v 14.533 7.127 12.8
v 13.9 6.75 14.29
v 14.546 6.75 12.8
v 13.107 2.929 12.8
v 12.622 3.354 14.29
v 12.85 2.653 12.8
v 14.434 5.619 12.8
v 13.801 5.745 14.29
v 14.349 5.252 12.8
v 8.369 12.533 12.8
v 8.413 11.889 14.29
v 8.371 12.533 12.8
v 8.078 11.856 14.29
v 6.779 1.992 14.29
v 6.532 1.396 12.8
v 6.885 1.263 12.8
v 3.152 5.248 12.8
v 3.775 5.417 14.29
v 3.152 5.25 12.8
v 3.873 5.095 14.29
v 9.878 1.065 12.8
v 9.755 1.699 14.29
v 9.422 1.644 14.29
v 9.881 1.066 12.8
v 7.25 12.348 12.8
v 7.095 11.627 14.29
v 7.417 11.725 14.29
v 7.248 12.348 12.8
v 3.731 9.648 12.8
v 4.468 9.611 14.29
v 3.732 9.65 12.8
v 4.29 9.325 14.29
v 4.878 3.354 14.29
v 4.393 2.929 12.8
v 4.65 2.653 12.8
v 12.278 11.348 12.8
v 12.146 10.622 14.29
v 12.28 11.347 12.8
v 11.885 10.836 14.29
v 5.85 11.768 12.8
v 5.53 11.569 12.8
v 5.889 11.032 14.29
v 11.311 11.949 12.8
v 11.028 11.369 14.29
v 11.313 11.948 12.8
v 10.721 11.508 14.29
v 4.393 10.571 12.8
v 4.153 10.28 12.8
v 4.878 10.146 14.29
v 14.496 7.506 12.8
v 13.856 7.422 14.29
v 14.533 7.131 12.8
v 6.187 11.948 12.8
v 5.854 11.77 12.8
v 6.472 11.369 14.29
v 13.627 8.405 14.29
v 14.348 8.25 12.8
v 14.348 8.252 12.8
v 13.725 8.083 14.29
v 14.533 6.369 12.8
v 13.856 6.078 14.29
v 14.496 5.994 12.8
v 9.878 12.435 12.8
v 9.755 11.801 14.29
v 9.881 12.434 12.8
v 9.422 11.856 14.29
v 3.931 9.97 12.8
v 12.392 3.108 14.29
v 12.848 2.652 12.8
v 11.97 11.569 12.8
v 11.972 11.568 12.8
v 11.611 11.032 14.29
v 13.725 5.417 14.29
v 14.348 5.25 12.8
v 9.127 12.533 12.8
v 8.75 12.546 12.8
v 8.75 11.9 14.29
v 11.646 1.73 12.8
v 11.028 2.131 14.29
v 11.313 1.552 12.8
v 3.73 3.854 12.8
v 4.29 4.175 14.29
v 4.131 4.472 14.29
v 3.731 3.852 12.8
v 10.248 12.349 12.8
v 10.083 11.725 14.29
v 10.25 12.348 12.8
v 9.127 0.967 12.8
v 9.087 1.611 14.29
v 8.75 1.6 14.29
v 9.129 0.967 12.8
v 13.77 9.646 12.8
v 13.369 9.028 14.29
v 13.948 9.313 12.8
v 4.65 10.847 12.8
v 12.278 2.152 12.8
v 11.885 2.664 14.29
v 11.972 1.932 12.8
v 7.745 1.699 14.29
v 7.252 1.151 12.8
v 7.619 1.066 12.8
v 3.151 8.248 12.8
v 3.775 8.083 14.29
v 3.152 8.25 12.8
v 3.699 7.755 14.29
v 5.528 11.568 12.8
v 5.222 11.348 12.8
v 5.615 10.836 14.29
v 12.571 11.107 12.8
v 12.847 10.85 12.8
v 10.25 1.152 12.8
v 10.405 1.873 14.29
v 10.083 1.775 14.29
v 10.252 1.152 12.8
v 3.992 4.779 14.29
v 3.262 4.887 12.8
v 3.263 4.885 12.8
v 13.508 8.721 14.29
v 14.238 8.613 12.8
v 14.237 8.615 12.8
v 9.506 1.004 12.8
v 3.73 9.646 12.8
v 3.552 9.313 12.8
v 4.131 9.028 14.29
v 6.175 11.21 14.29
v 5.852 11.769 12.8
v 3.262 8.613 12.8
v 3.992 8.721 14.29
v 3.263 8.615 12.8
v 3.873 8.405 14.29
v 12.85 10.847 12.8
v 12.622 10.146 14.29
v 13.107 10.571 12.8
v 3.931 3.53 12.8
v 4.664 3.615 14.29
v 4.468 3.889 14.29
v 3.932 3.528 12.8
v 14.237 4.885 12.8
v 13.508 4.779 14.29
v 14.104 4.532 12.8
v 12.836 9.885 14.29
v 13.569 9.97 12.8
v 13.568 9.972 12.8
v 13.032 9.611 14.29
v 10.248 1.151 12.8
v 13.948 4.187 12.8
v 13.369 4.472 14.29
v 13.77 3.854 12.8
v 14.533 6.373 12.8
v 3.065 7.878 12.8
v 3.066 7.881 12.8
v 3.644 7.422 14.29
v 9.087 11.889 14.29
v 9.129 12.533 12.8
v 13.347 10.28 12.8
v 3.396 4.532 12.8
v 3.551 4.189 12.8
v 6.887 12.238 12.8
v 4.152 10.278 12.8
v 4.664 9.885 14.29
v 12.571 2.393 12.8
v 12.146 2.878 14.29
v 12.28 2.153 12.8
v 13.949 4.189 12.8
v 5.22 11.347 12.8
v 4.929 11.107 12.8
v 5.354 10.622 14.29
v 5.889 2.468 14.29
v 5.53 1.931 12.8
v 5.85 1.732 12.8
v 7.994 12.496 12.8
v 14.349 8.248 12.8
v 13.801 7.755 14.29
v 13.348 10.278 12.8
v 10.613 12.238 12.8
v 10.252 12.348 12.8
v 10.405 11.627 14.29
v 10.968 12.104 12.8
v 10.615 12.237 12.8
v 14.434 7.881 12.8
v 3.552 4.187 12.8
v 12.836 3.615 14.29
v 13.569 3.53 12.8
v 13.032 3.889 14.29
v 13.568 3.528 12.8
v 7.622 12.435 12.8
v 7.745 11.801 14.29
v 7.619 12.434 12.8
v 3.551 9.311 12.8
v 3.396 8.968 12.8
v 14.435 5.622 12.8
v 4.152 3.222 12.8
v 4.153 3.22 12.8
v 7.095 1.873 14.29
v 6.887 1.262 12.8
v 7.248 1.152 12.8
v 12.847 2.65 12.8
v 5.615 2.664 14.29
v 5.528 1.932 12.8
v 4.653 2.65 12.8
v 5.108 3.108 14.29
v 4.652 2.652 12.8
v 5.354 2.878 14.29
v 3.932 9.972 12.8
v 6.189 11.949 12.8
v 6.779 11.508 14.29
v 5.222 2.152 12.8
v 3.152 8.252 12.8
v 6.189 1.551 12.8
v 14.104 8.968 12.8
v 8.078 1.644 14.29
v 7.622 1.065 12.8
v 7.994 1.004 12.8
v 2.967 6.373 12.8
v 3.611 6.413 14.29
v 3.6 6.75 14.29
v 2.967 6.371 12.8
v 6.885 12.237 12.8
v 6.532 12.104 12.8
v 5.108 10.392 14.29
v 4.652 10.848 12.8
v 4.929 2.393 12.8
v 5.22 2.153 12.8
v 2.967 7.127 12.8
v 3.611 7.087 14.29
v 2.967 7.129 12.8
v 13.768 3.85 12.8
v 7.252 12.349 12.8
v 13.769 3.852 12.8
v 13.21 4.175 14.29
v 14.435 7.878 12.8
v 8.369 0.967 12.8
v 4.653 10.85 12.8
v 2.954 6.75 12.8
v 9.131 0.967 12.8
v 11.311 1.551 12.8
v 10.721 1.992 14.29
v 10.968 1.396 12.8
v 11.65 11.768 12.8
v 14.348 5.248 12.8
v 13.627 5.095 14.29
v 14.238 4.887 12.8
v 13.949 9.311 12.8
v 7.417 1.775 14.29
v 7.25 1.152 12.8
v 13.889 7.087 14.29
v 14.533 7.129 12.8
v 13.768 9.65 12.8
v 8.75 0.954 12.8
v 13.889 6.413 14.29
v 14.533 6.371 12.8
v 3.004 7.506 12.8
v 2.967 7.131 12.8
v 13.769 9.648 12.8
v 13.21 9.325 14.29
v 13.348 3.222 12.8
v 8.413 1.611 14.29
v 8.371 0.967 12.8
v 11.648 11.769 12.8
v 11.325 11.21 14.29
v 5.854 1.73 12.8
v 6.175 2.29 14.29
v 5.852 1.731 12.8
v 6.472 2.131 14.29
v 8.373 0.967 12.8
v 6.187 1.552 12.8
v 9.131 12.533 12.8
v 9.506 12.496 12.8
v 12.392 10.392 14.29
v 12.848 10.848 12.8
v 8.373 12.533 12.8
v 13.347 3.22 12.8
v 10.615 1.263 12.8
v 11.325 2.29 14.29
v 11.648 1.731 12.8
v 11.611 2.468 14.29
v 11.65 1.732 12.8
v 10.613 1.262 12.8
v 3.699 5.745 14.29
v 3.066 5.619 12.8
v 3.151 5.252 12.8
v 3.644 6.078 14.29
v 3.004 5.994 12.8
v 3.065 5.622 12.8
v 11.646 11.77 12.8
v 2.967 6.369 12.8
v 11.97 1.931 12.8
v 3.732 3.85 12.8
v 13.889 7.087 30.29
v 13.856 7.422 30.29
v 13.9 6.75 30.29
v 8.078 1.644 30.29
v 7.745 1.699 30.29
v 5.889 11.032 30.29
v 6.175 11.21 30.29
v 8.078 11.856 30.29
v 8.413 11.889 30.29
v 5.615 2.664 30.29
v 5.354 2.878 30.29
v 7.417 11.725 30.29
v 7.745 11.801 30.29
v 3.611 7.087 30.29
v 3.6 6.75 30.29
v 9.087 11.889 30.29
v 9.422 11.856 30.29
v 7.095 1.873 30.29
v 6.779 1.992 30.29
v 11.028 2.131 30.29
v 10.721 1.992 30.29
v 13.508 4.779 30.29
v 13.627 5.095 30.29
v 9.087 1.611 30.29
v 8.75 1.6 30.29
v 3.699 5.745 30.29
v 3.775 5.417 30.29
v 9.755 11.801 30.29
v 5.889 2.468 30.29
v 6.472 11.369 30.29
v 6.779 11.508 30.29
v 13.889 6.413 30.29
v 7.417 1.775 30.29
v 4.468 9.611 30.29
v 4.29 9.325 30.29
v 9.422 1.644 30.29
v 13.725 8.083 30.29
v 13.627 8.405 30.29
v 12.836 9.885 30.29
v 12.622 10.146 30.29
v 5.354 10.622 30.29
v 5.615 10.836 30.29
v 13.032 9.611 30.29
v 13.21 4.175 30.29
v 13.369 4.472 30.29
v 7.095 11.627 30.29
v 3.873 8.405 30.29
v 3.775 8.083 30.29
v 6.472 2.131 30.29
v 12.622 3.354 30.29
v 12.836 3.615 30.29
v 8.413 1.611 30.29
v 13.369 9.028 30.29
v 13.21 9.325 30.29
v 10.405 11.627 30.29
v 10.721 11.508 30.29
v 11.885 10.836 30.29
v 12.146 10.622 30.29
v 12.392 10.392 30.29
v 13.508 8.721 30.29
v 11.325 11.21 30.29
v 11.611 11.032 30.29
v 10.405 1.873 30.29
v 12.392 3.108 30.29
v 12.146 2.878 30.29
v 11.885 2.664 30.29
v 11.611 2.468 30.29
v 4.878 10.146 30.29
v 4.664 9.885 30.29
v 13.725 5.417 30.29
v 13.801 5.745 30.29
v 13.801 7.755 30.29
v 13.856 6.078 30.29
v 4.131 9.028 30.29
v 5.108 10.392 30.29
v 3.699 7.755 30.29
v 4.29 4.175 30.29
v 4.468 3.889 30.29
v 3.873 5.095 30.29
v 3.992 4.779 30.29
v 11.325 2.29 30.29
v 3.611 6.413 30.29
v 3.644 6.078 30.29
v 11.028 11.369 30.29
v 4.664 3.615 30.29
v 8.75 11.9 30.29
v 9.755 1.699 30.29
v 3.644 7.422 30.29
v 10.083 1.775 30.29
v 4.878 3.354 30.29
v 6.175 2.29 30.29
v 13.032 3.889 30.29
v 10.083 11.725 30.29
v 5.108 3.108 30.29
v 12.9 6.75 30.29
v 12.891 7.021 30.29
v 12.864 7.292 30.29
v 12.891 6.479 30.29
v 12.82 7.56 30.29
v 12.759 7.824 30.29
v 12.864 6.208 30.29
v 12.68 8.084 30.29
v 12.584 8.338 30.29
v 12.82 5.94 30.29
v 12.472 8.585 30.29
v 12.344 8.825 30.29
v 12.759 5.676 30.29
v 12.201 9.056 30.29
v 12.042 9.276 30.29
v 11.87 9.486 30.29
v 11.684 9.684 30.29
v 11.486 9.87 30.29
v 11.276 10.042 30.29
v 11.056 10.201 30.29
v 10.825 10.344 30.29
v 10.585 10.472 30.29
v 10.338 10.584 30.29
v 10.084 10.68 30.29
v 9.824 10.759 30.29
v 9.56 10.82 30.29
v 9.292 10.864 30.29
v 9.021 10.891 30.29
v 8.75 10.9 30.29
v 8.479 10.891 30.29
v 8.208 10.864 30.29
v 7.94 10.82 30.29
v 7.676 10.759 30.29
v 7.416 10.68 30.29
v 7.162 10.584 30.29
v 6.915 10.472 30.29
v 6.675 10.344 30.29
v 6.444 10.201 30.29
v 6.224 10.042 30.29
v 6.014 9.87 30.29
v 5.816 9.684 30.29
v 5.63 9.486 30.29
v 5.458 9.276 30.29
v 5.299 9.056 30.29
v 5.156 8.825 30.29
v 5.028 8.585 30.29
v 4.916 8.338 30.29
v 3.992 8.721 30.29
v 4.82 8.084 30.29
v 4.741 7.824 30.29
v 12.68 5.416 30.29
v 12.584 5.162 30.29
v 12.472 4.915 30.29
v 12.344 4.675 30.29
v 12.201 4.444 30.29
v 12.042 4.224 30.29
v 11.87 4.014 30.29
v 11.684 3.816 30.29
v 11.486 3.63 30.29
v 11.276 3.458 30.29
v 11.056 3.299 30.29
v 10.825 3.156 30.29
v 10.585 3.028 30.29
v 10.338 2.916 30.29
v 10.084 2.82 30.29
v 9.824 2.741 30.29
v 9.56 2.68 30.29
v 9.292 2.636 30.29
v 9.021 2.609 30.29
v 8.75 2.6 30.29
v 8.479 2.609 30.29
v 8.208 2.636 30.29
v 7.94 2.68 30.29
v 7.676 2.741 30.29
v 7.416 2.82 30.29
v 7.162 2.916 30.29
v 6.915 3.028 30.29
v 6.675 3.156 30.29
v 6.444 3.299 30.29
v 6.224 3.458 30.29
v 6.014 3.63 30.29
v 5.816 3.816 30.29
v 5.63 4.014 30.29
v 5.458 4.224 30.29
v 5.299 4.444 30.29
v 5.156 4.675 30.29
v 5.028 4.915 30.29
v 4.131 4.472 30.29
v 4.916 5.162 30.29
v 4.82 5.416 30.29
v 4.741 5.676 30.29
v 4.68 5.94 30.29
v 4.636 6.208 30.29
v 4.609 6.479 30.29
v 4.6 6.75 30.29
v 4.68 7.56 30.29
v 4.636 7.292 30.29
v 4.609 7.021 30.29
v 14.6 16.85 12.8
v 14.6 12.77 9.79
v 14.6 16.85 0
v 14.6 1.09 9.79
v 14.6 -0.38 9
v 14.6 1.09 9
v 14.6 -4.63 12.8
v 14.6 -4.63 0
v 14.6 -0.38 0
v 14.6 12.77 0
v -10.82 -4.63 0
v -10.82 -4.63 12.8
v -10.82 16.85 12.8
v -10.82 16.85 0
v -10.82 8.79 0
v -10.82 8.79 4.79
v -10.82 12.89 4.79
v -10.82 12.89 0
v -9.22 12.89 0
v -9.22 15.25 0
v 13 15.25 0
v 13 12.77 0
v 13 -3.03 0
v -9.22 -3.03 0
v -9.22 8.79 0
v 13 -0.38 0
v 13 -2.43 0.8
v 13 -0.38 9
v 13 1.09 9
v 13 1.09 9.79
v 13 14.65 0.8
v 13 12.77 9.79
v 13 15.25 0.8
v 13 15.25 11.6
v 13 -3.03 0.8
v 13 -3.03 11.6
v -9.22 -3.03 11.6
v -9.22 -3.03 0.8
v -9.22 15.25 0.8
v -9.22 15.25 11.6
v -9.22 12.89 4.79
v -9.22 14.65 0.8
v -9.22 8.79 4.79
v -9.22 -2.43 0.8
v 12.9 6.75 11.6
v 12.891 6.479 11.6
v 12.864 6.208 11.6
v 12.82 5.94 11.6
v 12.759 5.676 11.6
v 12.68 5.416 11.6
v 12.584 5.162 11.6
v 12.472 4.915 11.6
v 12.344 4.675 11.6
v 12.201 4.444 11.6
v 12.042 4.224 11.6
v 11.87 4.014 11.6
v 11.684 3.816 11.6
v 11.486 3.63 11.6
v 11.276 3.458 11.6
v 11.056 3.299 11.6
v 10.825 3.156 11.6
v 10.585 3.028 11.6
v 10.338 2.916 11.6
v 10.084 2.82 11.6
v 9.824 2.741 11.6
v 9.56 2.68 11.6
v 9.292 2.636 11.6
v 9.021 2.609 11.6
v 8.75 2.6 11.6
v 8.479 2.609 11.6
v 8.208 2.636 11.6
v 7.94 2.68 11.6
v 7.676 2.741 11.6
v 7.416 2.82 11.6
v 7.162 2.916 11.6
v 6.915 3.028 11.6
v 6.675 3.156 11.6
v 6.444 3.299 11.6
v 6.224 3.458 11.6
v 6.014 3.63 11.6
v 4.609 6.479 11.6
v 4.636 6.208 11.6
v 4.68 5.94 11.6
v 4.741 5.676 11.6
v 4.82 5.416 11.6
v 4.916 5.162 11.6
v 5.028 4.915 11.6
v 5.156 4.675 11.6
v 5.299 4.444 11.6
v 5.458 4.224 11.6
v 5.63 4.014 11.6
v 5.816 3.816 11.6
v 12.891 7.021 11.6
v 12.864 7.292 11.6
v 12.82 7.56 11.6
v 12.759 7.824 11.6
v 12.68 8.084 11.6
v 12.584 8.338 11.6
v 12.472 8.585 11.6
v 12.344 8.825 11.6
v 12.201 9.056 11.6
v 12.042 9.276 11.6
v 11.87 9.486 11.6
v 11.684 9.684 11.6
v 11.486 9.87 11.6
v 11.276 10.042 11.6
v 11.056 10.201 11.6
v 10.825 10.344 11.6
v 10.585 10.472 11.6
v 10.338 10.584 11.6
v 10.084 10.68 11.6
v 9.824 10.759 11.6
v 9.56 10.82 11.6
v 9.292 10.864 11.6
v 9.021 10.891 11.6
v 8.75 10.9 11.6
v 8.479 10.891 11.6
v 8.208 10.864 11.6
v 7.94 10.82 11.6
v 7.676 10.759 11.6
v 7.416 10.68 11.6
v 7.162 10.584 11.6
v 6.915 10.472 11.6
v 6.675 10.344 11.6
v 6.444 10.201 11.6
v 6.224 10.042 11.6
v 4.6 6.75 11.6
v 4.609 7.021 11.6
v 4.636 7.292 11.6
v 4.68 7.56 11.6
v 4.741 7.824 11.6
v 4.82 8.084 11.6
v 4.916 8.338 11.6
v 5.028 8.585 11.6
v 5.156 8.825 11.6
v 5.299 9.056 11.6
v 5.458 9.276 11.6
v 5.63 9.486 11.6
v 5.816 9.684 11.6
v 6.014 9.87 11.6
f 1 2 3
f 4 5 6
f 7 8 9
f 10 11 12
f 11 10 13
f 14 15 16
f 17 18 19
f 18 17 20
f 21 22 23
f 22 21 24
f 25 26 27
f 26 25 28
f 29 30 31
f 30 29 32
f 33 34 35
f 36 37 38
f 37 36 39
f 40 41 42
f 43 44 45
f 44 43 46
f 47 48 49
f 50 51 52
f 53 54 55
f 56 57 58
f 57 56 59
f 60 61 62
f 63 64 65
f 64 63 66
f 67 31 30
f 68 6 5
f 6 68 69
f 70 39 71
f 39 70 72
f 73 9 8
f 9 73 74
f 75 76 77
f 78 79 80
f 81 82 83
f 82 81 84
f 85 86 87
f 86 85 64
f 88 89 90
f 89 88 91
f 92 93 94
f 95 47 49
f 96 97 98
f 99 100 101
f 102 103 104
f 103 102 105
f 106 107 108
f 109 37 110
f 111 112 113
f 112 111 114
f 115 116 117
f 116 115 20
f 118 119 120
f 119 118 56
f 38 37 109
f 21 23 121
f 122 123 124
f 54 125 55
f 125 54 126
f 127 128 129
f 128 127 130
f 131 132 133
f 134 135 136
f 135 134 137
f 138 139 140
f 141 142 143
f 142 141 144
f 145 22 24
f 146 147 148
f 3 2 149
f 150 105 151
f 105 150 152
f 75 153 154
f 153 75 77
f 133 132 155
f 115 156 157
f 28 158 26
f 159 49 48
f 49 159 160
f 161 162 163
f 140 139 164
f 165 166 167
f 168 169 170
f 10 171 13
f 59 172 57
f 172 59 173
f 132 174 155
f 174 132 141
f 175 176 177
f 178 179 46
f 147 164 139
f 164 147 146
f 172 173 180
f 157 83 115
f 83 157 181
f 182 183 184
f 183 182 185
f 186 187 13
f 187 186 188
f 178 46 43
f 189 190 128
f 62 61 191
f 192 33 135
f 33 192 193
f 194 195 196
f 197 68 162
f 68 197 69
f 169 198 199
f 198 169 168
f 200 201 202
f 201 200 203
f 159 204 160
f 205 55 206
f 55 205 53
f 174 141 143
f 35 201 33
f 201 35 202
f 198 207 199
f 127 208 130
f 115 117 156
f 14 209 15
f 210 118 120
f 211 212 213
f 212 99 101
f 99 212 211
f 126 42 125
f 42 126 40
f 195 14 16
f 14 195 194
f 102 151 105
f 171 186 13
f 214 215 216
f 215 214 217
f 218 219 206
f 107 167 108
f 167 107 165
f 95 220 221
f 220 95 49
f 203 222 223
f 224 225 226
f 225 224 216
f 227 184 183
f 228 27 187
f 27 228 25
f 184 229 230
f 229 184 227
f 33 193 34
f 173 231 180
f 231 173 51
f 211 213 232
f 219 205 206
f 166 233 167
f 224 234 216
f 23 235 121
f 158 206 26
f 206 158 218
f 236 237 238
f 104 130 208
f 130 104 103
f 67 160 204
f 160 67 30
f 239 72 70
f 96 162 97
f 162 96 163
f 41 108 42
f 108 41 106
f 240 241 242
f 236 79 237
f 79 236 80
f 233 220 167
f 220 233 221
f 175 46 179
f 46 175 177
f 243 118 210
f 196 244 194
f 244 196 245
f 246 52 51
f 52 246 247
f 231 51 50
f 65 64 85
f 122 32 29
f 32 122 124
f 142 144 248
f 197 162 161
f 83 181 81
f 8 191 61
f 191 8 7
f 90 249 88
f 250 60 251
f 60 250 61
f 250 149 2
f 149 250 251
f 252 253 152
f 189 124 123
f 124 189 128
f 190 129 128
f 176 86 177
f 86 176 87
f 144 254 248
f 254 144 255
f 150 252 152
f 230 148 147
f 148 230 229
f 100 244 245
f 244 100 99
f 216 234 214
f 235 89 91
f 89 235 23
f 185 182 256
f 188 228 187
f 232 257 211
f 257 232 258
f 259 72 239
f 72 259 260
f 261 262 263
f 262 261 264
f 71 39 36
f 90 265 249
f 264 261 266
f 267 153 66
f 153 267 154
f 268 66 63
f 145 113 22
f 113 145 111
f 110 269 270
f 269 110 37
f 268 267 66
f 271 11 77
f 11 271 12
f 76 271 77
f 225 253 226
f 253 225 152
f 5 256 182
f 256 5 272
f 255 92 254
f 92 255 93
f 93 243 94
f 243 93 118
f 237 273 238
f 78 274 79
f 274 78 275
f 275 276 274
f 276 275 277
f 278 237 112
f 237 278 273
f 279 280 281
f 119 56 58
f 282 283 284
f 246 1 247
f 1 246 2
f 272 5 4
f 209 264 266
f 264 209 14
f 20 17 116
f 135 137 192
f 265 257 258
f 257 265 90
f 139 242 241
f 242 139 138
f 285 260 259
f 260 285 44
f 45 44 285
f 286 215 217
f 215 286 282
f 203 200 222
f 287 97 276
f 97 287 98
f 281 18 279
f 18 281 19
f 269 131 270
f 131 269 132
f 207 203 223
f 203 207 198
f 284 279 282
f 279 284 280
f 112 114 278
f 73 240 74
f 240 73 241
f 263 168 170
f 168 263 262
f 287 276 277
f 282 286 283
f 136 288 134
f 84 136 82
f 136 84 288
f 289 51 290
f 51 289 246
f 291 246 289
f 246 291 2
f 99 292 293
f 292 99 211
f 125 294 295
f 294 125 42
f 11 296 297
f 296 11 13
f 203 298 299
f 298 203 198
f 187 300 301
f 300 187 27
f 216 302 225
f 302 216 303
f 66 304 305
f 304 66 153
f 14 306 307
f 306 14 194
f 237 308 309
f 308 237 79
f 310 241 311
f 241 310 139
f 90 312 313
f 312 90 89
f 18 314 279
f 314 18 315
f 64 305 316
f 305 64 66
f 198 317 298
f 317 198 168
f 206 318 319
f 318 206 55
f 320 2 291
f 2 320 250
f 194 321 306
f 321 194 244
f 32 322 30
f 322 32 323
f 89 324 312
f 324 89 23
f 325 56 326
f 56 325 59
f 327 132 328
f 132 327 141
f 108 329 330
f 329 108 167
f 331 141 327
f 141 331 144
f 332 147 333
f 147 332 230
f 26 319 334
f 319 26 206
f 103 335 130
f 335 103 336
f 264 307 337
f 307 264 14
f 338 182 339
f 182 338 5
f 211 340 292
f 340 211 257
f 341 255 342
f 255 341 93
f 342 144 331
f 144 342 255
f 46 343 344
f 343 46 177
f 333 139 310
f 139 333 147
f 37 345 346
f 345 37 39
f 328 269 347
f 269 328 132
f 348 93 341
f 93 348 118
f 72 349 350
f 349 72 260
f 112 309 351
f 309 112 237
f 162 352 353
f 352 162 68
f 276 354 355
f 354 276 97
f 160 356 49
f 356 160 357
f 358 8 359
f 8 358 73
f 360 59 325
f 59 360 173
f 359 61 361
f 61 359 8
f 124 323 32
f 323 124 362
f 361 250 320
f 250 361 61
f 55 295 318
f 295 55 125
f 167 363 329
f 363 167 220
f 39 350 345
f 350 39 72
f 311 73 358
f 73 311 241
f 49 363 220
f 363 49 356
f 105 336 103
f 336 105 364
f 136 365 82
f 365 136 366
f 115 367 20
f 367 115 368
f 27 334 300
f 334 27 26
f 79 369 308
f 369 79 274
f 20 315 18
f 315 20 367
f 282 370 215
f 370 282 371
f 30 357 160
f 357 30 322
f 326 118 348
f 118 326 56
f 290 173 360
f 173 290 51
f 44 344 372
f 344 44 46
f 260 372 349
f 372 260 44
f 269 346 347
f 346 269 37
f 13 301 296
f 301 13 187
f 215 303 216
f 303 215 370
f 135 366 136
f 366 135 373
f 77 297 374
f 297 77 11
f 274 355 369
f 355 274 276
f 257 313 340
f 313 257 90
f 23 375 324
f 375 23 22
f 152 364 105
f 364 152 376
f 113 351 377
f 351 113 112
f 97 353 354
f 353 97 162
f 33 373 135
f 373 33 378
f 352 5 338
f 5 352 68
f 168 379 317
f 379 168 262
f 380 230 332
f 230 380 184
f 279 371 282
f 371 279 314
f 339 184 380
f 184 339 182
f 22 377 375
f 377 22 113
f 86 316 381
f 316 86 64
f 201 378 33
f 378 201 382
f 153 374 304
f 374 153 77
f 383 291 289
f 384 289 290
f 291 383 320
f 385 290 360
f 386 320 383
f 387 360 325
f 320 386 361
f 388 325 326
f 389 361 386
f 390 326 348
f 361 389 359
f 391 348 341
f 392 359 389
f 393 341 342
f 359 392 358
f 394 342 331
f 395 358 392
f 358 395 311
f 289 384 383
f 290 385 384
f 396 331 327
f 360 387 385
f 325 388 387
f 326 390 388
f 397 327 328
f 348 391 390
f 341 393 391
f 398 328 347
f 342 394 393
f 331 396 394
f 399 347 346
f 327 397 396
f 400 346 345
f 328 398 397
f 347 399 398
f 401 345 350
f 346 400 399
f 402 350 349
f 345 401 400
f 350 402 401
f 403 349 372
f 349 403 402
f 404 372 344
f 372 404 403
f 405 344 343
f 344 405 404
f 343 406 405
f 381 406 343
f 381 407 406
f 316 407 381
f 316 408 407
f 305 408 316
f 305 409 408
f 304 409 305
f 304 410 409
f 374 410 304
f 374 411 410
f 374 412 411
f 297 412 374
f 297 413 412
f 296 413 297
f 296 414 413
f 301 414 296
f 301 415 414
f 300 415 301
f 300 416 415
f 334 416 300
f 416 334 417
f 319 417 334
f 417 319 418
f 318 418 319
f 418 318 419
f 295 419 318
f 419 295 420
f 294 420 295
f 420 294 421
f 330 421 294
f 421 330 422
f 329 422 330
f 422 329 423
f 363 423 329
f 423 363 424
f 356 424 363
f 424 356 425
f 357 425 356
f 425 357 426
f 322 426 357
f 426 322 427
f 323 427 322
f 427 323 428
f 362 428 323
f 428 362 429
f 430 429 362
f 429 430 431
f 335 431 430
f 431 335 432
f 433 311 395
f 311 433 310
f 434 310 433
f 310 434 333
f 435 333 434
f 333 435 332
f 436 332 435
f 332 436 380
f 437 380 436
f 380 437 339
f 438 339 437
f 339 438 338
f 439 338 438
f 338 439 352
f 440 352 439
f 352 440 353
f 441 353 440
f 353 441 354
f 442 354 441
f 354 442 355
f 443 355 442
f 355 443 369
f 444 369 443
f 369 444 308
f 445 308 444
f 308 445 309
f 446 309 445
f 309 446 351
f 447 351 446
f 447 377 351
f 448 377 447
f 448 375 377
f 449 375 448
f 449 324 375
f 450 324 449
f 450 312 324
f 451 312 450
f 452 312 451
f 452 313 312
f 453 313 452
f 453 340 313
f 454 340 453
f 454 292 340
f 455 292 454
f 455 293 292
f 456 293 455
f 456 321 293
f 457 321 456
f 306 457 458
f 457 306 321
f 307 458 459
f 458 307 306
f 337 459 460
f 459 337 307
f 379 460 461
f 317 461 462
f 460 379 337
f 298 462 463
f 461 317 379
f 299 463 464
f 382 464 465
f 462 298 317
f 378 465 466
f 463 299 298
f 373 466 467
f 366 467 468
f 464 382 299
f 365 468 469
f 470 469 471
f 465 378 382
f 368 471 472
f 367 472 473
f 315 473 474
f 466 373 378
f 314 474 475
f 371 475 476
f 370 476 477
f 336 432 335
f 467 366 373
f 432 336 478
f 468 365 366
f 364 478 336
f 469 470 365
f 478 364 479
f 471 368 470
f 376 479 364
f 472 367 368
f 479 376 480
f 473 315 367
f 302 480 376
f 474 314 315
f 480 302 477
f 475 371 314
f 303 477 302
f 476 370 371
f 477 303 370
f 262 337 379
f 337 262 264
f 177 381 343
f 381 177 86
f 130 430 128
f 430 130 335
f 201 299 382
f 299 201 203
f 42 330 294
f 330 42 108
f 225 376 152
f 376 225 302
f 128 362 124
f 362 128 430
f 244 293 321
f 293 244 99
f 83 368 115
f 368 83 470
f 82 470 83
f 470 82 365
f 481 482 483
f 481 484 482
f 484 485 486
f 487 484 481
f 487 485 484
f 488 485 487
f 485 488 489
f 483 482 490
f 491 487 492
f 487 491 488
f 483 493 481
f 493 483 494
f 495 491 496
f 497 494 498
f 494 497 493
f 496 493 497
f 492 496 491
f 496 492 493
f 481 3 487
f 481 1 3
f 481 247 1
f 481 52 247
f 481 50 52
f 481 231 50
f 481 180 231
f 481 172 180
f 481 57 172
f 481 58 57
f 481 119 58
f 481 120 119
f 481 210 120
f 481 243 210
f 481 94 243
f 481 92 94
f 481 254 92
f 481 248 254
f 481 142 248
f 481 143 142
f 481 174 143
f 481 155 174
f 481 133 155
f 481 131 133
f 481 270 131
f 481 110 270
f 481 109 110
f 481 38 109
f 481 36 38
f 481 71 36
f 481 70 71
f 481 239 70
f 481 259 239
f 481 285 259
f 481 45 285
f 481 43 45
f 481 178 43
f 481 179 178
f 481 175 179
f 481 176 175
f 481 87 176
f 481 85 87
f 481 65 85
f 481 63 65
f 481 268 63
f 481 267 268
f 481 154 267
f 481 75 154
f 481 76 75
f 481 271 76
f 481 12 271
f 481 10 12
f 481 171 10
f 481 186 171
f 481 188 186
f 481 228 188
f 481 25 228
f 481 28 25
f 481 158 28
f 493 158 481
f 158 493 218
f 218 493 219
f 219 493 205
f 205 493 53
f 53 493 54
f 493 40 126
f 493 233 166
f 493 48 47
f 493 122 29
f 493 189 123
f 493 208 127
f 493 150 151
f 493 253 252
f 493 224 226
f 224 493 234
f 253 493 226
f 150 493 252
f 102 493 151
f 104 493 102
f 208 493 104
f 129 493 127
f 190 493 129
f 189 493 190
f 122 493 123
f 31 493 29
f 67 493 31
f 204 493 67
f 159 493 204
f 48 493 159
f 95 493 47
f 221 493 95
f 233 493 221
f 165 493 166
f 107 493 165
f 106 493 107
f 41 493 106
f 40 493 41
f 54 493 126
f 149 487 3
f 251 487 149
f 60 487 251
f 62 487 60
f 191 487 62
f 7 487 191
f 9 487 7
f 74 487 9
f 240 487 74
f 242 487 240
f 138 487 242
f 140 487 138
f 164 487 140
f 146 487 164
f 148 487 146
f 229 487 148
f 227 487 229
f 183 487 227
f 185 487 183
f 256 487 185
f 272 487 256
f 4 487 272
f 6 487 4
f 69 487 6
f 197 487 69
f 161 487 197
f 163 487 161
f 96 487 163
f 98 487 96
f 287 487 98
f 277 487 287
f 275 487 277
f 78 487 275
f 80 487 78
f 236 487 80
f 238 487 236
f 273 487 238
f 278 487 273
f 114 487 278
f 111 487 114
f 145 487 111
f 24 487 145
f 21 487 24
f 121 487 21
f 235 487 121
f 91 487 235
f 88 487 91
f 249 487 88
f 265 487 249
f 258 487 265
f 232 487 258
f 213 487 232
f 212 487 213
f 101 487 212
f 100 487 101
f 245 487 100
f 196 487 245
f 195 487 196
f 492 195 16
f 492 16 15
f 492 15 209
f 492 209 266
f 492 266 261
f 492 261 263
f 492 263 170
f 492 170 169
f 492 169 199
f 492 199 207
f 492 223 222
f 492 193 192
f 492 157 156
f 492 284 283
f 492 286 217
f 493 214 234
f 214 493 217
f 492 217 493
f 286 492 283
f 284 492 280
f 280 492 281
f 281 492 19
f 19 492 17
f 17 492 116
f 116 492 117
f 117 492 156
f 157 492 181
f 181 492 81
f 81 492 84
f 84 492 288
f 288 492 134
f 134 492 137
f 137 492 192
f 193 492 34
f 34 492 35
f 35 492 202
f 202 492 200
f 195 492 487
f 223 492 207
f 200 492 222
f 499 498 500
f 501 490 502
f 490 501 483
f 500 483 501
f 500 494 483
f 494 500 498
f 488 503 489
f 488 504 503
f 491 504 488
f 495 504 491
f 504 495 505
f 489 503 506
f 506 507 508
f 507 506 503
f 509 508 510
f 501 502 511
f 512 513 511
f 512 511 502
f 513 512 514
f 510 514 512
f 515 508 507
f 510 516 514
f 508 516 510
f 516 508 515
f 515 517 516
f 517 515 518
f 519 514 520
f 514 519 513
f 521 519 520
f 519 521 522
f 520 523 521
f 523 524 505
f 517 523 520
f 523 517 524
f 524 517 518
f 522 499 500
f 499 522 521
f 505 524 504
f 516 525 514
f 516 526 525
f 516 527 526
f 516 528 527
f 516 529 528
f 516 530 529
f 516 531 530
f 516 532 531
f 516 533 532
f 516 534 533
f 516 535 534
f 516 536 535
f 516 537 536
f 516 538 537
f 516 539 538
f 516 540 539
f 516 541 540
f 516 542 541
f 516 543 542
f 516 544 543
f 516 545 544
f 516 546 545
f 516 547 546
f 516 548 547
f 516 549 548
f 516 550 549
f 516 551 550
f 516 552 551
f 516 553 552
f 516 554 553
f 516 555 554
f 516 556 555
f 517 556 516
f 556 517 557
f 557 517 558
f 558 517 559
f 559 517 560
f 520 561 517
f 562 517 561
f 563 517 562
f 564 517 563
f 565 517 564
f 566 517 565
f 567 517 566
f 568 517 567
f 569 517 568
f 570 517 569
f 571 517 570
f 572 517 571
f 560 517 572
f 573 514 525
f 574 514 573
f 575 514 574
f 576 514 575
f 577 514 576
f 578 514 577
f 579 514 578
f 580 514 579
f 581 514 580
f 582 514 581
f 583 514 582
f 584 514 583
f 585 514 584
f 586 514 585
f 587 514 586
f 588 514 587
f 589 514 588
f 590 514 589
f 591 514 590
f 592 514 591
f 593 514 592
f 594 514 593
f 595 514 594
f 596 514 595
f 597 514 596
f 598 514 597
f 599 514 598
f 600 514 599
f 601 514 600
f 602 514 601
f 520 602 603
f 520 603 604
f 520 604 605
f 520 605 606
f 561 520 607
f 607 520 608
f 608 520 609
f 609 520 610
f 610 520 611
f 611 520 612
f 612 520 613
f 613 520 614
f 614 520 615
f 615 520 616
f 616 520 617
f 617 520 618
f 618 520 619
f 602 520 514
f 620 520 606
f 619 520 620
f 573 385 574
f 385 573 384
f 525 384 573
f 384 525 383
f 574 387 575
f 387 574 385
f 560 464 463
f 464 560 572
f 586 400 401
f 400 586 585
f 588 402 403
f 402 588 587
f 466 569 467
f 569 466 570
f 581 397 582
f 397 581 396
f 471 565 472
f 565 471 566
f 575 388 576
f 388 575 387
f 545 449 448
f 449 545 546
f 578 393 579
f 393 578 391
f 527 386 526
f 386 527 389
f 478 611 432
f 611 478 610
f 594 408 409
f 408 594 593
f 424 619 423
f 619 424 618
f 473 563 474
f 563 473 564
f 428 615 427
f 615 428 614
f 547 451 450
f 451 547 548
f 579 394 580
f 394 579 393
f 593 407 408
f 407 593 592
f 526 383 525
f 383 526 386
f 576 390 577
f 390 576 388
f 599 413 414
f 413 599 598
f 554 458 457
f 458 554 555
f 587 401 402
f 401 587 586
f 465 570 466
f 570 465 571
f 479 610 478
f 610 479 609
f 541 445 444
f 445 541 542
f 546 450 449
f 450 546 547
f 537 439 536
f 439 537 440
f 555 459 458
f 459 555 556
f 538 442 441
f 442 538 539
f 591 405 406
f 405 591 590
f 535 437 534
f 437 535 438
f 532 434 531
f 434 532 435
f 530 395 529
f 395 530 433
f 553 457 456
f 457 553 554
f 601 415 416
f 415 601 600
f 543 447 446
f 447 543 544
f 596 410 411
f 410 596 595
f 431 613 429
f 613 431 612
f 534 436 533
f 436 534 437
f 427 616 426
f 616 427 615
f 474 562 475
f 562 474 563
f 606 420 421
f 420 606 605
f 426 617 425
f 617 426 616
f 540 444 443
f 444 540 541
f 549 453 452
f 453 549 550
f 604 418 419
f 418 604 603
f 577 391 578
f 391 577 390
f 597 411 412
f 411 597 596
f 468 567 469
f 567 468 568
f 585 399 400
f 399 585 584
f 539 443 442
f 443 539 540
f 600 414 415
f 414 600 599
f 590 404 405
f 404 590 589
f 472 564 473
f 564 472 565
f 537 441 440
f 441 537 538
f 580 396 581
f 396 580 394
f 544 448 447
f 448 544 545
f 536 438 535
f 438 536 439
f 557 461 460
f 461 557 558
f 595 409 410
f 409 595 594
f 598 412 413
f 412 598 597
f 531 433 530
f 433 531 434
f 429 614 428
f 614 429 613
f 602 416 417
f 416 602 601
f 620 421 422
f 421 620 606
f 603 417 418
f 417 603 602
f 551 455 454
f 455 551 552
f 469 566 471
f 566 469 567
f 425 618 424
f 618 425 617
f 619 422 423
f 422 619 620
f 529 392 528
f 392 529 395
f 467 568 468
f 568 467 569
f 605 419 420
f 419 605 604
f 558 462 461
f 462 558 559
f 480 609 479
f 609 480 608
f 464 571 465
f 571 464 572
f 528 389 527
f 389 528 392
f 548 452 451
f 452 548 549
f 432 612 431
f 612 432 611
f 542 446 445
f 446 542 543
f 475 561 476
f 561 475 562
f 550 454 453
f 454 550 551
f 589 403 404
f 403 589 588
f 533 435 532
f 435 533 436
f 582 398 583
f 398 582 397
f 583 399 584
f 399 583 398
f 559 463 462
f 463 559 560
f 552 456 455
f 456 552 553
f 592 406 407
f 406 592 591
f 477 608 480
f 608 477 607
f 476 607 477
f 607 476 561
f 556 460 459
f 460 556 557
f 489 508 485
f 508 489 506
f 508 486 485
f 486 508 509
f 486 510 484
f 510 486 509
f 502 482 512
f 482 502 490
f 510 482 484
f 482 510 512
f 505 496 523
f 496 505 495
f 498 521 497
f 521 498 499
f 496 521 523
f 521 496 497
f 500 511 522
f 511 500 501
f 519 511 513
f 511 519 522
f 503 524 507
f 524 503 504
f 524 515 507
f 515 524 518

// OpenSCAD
// Door unit: a housing for the whole XIAO ESP32S3 Sense, with a tube that
// friction-fits in the door viewer's inner bore. It hangs from the tube on its own,
// with nothing stuck to the door. Slide it in and out to find the best picture.
//
// The board goes in from the open back and snaps past two small lips. The camera's
// lens barrel sits in the tube's opening, which centres it.
// USB-C points down, and the WiFi antenna's cable leaves through the top.
//
// Board positions come from Seeed's 3D model of the XIAO ESP32S3 Sense, in its own
// coordinates: x runs along the board (USB at +x, which is down), y runs from the
// back of the main board toward the door, z runs across the board.
// Print with the open back on the bed. No supports: the front bridges across.
// All dimensions in mm.

/* [Viewer - measured] */
bore_d      = 10.5;   // inner bore of the viewer
bore_depth  = 18.0;   // from the viewer's inner face to the eyepiece glass
tip_gap     = 2.0;    // tube stops this far short of the glass

/* [Tube] */
tube_od     = 10.3;   // use the size that worked from the fit test
tube_id     = 8.3;    // the lens barrel is 7.85 across
collar_d    = 11.6;   // stiffens the joint between tube and housing
collar_h    = 1.5;

/* [Housing] */
wall        = 1.6;
front_t     = 1.2;    // front wall, between the camera body and the tube
gap         = 0.25;   // clearance around the boards
lip         = 0.6;    // how far each snap lip reaches over the main board
lip_h       = 0.8;

/* [Output] */
part        = "housing"; // [housing, fit_test]

$fn = 96;
eps = 0.01;

// ---- the board, from Seeed's 3D model ----
board_x  = [-8.97, 12.75];   // antenna end of the expansion board to the camera's far edge
board_z  = [-15.00, 2.78];   // main board, across
back_y   = -0.25;            // back face of the main board
cam_y    = 10.05;            // front face of the camera's square body
lens     = [8.75, -6.75];    // lens axis, x and z
lens_top = 13.71;
usb      = [-10.59, -1.65];  // USB-C port, across (z), on the +x edge
usb_y    = 4.21;             // the port's front face
ufl      = [-12.39, -9.29];  // antenna socket, across (z), at the -x end
sd       = [-12.52, -1.34];  // microSD card, across (z): it sticks out past the +x edge
sd_y     = 8.25;             // the card's front face
plug_w   = 13.0;             // a USB-C plug's moulding is about 12 x 7
plug_d   = 7.0;

in_x0 = board_x[0] - gap;  in_x1 = board_x[1] + gap;
in_z0 = board_z[0] - gap;  in_z1 = board_z[1] + gap;
y0    = back_y - gap - lip_h;          // the open back, on the bed
y_in  = cam_y + gap;                   // inside face of the front wall
y_out = y_in + front_t;                // outside face
tube_len = bore_depth - tip_gap;       // how far the tube can go into the viewer

assert(tube_od < bore_d, "Tube is wider than the viewer's bore");
assert(tube_id > 7.85 + 0.2, "The lens barrel won't fit in the tube");
assert(lens[0] + collar_d / 2 <= in_x1 + wall + eps, "Collar overhangs the housing");
echo(str("Housing ", in_x1 - in_x0 + 2 * wall, " x ", in_z1 - in_z0 + 2 * wall, " x ", y_out - y0,
         " mm, tube ", tube_od, " x ", tube_len, " mm, lens ", lens_top - y_out, " mm into the tube"));

module housing() {
    difference() {
        union() {
            // shell
            translate([in_x0 - wall, y0, in_z0 - wall])
                cube([in_x1 - in_x0 + 2 * wall, y_out - y0, in_z1 - in_z0 + 2 * wall]);
            // collar and tube, on the lens axis
            translate([lens[0], y_out - eps, lens[1]]) rotate([-90, 0, 0]) {
                cylinder(d1 = collar_d, d2 = tube_od, h = collar_h);
                cylinder(d = tube_od, h = collar_h + tube_len);
            }
        }
        // the board's pocket, open at the back
        translate([in_x0, y0 - eps, in_z0]) cube([in_x1 - in_x0, y_in - y0 + eps, in_z1 - in_z0]);
        // the view: through the front and down the tube
        translate([lens[0], y_in - eps, lens[1]]) rotate([-90, 0, 0])
            cylinder(d = tube_id, h = front_t + collar_h + tube_len + 3 * eps);
        // USB-C plug and microSD card, through the bottom wall, open to the back
        translate([in_x1 - eps, y0 - eps, (usb[0] + usb[1]) / 2 - plug_w / 2])
            cube([wall + 2 * eps, usb_y + plug_d / 2 - y0, plug_w]);
        translate([in_x1 - eps, y0 - eps, sd[0] - gap])
            cube([wall + 2 * eps, sd_y + gap - y0, sd[1] - sd[0] + 2 * gap]);
        // antenna cable, through the top wall, open to the back
        translate([in_x0 - wall - eps, y0 - eps, ufl[0] - 0.5])
            cube([wall + 2 * eps, 3.5 - y0, ufl[1] - ufl[0] + 1]);
    }
    // Snap lips along the two long sides. They lean in as they rise, so they print
    // without support, and their flat tops hold the back of the main board.
    for (side = [[in_z0, 1], [in_z1, -1]])
        translate([in_x0, y0, side[0]]) rotate([0, 90, 0])
            linear_extrude(in_x1 - in_x0)
                polygon([[0, 0], [0, lip_h], [-side[1] * lip, lip_h]]);
}

// Three short rings to find the tightest size that still slides.
module fit_test() {
    ods = [tube_od - 0.1, tube_od, tube_od + 0.1];
    for (i = [0 : 2])
        translate([i * 16, 0, 0]) difference() {
            union() {
                cylinder(d = ods[i], h = 8);
                translate([0, 0, 8]) cylinder(d = 14, h = 1 + i);   // ring height shows the size: 1, 2 or 3 mm
            }
            translate([0, 0, -eps]) cylinder(d = tube_id, h = 12 + 2 * eps);
        }
}

// The model's y (toward the door) becomes print z, with the open back on the bed.
if (part == "housing") rotate([90, 0, 0]) translate([0, -y0, 0]) housing();
else if (part == "fit_test") fit_test();
